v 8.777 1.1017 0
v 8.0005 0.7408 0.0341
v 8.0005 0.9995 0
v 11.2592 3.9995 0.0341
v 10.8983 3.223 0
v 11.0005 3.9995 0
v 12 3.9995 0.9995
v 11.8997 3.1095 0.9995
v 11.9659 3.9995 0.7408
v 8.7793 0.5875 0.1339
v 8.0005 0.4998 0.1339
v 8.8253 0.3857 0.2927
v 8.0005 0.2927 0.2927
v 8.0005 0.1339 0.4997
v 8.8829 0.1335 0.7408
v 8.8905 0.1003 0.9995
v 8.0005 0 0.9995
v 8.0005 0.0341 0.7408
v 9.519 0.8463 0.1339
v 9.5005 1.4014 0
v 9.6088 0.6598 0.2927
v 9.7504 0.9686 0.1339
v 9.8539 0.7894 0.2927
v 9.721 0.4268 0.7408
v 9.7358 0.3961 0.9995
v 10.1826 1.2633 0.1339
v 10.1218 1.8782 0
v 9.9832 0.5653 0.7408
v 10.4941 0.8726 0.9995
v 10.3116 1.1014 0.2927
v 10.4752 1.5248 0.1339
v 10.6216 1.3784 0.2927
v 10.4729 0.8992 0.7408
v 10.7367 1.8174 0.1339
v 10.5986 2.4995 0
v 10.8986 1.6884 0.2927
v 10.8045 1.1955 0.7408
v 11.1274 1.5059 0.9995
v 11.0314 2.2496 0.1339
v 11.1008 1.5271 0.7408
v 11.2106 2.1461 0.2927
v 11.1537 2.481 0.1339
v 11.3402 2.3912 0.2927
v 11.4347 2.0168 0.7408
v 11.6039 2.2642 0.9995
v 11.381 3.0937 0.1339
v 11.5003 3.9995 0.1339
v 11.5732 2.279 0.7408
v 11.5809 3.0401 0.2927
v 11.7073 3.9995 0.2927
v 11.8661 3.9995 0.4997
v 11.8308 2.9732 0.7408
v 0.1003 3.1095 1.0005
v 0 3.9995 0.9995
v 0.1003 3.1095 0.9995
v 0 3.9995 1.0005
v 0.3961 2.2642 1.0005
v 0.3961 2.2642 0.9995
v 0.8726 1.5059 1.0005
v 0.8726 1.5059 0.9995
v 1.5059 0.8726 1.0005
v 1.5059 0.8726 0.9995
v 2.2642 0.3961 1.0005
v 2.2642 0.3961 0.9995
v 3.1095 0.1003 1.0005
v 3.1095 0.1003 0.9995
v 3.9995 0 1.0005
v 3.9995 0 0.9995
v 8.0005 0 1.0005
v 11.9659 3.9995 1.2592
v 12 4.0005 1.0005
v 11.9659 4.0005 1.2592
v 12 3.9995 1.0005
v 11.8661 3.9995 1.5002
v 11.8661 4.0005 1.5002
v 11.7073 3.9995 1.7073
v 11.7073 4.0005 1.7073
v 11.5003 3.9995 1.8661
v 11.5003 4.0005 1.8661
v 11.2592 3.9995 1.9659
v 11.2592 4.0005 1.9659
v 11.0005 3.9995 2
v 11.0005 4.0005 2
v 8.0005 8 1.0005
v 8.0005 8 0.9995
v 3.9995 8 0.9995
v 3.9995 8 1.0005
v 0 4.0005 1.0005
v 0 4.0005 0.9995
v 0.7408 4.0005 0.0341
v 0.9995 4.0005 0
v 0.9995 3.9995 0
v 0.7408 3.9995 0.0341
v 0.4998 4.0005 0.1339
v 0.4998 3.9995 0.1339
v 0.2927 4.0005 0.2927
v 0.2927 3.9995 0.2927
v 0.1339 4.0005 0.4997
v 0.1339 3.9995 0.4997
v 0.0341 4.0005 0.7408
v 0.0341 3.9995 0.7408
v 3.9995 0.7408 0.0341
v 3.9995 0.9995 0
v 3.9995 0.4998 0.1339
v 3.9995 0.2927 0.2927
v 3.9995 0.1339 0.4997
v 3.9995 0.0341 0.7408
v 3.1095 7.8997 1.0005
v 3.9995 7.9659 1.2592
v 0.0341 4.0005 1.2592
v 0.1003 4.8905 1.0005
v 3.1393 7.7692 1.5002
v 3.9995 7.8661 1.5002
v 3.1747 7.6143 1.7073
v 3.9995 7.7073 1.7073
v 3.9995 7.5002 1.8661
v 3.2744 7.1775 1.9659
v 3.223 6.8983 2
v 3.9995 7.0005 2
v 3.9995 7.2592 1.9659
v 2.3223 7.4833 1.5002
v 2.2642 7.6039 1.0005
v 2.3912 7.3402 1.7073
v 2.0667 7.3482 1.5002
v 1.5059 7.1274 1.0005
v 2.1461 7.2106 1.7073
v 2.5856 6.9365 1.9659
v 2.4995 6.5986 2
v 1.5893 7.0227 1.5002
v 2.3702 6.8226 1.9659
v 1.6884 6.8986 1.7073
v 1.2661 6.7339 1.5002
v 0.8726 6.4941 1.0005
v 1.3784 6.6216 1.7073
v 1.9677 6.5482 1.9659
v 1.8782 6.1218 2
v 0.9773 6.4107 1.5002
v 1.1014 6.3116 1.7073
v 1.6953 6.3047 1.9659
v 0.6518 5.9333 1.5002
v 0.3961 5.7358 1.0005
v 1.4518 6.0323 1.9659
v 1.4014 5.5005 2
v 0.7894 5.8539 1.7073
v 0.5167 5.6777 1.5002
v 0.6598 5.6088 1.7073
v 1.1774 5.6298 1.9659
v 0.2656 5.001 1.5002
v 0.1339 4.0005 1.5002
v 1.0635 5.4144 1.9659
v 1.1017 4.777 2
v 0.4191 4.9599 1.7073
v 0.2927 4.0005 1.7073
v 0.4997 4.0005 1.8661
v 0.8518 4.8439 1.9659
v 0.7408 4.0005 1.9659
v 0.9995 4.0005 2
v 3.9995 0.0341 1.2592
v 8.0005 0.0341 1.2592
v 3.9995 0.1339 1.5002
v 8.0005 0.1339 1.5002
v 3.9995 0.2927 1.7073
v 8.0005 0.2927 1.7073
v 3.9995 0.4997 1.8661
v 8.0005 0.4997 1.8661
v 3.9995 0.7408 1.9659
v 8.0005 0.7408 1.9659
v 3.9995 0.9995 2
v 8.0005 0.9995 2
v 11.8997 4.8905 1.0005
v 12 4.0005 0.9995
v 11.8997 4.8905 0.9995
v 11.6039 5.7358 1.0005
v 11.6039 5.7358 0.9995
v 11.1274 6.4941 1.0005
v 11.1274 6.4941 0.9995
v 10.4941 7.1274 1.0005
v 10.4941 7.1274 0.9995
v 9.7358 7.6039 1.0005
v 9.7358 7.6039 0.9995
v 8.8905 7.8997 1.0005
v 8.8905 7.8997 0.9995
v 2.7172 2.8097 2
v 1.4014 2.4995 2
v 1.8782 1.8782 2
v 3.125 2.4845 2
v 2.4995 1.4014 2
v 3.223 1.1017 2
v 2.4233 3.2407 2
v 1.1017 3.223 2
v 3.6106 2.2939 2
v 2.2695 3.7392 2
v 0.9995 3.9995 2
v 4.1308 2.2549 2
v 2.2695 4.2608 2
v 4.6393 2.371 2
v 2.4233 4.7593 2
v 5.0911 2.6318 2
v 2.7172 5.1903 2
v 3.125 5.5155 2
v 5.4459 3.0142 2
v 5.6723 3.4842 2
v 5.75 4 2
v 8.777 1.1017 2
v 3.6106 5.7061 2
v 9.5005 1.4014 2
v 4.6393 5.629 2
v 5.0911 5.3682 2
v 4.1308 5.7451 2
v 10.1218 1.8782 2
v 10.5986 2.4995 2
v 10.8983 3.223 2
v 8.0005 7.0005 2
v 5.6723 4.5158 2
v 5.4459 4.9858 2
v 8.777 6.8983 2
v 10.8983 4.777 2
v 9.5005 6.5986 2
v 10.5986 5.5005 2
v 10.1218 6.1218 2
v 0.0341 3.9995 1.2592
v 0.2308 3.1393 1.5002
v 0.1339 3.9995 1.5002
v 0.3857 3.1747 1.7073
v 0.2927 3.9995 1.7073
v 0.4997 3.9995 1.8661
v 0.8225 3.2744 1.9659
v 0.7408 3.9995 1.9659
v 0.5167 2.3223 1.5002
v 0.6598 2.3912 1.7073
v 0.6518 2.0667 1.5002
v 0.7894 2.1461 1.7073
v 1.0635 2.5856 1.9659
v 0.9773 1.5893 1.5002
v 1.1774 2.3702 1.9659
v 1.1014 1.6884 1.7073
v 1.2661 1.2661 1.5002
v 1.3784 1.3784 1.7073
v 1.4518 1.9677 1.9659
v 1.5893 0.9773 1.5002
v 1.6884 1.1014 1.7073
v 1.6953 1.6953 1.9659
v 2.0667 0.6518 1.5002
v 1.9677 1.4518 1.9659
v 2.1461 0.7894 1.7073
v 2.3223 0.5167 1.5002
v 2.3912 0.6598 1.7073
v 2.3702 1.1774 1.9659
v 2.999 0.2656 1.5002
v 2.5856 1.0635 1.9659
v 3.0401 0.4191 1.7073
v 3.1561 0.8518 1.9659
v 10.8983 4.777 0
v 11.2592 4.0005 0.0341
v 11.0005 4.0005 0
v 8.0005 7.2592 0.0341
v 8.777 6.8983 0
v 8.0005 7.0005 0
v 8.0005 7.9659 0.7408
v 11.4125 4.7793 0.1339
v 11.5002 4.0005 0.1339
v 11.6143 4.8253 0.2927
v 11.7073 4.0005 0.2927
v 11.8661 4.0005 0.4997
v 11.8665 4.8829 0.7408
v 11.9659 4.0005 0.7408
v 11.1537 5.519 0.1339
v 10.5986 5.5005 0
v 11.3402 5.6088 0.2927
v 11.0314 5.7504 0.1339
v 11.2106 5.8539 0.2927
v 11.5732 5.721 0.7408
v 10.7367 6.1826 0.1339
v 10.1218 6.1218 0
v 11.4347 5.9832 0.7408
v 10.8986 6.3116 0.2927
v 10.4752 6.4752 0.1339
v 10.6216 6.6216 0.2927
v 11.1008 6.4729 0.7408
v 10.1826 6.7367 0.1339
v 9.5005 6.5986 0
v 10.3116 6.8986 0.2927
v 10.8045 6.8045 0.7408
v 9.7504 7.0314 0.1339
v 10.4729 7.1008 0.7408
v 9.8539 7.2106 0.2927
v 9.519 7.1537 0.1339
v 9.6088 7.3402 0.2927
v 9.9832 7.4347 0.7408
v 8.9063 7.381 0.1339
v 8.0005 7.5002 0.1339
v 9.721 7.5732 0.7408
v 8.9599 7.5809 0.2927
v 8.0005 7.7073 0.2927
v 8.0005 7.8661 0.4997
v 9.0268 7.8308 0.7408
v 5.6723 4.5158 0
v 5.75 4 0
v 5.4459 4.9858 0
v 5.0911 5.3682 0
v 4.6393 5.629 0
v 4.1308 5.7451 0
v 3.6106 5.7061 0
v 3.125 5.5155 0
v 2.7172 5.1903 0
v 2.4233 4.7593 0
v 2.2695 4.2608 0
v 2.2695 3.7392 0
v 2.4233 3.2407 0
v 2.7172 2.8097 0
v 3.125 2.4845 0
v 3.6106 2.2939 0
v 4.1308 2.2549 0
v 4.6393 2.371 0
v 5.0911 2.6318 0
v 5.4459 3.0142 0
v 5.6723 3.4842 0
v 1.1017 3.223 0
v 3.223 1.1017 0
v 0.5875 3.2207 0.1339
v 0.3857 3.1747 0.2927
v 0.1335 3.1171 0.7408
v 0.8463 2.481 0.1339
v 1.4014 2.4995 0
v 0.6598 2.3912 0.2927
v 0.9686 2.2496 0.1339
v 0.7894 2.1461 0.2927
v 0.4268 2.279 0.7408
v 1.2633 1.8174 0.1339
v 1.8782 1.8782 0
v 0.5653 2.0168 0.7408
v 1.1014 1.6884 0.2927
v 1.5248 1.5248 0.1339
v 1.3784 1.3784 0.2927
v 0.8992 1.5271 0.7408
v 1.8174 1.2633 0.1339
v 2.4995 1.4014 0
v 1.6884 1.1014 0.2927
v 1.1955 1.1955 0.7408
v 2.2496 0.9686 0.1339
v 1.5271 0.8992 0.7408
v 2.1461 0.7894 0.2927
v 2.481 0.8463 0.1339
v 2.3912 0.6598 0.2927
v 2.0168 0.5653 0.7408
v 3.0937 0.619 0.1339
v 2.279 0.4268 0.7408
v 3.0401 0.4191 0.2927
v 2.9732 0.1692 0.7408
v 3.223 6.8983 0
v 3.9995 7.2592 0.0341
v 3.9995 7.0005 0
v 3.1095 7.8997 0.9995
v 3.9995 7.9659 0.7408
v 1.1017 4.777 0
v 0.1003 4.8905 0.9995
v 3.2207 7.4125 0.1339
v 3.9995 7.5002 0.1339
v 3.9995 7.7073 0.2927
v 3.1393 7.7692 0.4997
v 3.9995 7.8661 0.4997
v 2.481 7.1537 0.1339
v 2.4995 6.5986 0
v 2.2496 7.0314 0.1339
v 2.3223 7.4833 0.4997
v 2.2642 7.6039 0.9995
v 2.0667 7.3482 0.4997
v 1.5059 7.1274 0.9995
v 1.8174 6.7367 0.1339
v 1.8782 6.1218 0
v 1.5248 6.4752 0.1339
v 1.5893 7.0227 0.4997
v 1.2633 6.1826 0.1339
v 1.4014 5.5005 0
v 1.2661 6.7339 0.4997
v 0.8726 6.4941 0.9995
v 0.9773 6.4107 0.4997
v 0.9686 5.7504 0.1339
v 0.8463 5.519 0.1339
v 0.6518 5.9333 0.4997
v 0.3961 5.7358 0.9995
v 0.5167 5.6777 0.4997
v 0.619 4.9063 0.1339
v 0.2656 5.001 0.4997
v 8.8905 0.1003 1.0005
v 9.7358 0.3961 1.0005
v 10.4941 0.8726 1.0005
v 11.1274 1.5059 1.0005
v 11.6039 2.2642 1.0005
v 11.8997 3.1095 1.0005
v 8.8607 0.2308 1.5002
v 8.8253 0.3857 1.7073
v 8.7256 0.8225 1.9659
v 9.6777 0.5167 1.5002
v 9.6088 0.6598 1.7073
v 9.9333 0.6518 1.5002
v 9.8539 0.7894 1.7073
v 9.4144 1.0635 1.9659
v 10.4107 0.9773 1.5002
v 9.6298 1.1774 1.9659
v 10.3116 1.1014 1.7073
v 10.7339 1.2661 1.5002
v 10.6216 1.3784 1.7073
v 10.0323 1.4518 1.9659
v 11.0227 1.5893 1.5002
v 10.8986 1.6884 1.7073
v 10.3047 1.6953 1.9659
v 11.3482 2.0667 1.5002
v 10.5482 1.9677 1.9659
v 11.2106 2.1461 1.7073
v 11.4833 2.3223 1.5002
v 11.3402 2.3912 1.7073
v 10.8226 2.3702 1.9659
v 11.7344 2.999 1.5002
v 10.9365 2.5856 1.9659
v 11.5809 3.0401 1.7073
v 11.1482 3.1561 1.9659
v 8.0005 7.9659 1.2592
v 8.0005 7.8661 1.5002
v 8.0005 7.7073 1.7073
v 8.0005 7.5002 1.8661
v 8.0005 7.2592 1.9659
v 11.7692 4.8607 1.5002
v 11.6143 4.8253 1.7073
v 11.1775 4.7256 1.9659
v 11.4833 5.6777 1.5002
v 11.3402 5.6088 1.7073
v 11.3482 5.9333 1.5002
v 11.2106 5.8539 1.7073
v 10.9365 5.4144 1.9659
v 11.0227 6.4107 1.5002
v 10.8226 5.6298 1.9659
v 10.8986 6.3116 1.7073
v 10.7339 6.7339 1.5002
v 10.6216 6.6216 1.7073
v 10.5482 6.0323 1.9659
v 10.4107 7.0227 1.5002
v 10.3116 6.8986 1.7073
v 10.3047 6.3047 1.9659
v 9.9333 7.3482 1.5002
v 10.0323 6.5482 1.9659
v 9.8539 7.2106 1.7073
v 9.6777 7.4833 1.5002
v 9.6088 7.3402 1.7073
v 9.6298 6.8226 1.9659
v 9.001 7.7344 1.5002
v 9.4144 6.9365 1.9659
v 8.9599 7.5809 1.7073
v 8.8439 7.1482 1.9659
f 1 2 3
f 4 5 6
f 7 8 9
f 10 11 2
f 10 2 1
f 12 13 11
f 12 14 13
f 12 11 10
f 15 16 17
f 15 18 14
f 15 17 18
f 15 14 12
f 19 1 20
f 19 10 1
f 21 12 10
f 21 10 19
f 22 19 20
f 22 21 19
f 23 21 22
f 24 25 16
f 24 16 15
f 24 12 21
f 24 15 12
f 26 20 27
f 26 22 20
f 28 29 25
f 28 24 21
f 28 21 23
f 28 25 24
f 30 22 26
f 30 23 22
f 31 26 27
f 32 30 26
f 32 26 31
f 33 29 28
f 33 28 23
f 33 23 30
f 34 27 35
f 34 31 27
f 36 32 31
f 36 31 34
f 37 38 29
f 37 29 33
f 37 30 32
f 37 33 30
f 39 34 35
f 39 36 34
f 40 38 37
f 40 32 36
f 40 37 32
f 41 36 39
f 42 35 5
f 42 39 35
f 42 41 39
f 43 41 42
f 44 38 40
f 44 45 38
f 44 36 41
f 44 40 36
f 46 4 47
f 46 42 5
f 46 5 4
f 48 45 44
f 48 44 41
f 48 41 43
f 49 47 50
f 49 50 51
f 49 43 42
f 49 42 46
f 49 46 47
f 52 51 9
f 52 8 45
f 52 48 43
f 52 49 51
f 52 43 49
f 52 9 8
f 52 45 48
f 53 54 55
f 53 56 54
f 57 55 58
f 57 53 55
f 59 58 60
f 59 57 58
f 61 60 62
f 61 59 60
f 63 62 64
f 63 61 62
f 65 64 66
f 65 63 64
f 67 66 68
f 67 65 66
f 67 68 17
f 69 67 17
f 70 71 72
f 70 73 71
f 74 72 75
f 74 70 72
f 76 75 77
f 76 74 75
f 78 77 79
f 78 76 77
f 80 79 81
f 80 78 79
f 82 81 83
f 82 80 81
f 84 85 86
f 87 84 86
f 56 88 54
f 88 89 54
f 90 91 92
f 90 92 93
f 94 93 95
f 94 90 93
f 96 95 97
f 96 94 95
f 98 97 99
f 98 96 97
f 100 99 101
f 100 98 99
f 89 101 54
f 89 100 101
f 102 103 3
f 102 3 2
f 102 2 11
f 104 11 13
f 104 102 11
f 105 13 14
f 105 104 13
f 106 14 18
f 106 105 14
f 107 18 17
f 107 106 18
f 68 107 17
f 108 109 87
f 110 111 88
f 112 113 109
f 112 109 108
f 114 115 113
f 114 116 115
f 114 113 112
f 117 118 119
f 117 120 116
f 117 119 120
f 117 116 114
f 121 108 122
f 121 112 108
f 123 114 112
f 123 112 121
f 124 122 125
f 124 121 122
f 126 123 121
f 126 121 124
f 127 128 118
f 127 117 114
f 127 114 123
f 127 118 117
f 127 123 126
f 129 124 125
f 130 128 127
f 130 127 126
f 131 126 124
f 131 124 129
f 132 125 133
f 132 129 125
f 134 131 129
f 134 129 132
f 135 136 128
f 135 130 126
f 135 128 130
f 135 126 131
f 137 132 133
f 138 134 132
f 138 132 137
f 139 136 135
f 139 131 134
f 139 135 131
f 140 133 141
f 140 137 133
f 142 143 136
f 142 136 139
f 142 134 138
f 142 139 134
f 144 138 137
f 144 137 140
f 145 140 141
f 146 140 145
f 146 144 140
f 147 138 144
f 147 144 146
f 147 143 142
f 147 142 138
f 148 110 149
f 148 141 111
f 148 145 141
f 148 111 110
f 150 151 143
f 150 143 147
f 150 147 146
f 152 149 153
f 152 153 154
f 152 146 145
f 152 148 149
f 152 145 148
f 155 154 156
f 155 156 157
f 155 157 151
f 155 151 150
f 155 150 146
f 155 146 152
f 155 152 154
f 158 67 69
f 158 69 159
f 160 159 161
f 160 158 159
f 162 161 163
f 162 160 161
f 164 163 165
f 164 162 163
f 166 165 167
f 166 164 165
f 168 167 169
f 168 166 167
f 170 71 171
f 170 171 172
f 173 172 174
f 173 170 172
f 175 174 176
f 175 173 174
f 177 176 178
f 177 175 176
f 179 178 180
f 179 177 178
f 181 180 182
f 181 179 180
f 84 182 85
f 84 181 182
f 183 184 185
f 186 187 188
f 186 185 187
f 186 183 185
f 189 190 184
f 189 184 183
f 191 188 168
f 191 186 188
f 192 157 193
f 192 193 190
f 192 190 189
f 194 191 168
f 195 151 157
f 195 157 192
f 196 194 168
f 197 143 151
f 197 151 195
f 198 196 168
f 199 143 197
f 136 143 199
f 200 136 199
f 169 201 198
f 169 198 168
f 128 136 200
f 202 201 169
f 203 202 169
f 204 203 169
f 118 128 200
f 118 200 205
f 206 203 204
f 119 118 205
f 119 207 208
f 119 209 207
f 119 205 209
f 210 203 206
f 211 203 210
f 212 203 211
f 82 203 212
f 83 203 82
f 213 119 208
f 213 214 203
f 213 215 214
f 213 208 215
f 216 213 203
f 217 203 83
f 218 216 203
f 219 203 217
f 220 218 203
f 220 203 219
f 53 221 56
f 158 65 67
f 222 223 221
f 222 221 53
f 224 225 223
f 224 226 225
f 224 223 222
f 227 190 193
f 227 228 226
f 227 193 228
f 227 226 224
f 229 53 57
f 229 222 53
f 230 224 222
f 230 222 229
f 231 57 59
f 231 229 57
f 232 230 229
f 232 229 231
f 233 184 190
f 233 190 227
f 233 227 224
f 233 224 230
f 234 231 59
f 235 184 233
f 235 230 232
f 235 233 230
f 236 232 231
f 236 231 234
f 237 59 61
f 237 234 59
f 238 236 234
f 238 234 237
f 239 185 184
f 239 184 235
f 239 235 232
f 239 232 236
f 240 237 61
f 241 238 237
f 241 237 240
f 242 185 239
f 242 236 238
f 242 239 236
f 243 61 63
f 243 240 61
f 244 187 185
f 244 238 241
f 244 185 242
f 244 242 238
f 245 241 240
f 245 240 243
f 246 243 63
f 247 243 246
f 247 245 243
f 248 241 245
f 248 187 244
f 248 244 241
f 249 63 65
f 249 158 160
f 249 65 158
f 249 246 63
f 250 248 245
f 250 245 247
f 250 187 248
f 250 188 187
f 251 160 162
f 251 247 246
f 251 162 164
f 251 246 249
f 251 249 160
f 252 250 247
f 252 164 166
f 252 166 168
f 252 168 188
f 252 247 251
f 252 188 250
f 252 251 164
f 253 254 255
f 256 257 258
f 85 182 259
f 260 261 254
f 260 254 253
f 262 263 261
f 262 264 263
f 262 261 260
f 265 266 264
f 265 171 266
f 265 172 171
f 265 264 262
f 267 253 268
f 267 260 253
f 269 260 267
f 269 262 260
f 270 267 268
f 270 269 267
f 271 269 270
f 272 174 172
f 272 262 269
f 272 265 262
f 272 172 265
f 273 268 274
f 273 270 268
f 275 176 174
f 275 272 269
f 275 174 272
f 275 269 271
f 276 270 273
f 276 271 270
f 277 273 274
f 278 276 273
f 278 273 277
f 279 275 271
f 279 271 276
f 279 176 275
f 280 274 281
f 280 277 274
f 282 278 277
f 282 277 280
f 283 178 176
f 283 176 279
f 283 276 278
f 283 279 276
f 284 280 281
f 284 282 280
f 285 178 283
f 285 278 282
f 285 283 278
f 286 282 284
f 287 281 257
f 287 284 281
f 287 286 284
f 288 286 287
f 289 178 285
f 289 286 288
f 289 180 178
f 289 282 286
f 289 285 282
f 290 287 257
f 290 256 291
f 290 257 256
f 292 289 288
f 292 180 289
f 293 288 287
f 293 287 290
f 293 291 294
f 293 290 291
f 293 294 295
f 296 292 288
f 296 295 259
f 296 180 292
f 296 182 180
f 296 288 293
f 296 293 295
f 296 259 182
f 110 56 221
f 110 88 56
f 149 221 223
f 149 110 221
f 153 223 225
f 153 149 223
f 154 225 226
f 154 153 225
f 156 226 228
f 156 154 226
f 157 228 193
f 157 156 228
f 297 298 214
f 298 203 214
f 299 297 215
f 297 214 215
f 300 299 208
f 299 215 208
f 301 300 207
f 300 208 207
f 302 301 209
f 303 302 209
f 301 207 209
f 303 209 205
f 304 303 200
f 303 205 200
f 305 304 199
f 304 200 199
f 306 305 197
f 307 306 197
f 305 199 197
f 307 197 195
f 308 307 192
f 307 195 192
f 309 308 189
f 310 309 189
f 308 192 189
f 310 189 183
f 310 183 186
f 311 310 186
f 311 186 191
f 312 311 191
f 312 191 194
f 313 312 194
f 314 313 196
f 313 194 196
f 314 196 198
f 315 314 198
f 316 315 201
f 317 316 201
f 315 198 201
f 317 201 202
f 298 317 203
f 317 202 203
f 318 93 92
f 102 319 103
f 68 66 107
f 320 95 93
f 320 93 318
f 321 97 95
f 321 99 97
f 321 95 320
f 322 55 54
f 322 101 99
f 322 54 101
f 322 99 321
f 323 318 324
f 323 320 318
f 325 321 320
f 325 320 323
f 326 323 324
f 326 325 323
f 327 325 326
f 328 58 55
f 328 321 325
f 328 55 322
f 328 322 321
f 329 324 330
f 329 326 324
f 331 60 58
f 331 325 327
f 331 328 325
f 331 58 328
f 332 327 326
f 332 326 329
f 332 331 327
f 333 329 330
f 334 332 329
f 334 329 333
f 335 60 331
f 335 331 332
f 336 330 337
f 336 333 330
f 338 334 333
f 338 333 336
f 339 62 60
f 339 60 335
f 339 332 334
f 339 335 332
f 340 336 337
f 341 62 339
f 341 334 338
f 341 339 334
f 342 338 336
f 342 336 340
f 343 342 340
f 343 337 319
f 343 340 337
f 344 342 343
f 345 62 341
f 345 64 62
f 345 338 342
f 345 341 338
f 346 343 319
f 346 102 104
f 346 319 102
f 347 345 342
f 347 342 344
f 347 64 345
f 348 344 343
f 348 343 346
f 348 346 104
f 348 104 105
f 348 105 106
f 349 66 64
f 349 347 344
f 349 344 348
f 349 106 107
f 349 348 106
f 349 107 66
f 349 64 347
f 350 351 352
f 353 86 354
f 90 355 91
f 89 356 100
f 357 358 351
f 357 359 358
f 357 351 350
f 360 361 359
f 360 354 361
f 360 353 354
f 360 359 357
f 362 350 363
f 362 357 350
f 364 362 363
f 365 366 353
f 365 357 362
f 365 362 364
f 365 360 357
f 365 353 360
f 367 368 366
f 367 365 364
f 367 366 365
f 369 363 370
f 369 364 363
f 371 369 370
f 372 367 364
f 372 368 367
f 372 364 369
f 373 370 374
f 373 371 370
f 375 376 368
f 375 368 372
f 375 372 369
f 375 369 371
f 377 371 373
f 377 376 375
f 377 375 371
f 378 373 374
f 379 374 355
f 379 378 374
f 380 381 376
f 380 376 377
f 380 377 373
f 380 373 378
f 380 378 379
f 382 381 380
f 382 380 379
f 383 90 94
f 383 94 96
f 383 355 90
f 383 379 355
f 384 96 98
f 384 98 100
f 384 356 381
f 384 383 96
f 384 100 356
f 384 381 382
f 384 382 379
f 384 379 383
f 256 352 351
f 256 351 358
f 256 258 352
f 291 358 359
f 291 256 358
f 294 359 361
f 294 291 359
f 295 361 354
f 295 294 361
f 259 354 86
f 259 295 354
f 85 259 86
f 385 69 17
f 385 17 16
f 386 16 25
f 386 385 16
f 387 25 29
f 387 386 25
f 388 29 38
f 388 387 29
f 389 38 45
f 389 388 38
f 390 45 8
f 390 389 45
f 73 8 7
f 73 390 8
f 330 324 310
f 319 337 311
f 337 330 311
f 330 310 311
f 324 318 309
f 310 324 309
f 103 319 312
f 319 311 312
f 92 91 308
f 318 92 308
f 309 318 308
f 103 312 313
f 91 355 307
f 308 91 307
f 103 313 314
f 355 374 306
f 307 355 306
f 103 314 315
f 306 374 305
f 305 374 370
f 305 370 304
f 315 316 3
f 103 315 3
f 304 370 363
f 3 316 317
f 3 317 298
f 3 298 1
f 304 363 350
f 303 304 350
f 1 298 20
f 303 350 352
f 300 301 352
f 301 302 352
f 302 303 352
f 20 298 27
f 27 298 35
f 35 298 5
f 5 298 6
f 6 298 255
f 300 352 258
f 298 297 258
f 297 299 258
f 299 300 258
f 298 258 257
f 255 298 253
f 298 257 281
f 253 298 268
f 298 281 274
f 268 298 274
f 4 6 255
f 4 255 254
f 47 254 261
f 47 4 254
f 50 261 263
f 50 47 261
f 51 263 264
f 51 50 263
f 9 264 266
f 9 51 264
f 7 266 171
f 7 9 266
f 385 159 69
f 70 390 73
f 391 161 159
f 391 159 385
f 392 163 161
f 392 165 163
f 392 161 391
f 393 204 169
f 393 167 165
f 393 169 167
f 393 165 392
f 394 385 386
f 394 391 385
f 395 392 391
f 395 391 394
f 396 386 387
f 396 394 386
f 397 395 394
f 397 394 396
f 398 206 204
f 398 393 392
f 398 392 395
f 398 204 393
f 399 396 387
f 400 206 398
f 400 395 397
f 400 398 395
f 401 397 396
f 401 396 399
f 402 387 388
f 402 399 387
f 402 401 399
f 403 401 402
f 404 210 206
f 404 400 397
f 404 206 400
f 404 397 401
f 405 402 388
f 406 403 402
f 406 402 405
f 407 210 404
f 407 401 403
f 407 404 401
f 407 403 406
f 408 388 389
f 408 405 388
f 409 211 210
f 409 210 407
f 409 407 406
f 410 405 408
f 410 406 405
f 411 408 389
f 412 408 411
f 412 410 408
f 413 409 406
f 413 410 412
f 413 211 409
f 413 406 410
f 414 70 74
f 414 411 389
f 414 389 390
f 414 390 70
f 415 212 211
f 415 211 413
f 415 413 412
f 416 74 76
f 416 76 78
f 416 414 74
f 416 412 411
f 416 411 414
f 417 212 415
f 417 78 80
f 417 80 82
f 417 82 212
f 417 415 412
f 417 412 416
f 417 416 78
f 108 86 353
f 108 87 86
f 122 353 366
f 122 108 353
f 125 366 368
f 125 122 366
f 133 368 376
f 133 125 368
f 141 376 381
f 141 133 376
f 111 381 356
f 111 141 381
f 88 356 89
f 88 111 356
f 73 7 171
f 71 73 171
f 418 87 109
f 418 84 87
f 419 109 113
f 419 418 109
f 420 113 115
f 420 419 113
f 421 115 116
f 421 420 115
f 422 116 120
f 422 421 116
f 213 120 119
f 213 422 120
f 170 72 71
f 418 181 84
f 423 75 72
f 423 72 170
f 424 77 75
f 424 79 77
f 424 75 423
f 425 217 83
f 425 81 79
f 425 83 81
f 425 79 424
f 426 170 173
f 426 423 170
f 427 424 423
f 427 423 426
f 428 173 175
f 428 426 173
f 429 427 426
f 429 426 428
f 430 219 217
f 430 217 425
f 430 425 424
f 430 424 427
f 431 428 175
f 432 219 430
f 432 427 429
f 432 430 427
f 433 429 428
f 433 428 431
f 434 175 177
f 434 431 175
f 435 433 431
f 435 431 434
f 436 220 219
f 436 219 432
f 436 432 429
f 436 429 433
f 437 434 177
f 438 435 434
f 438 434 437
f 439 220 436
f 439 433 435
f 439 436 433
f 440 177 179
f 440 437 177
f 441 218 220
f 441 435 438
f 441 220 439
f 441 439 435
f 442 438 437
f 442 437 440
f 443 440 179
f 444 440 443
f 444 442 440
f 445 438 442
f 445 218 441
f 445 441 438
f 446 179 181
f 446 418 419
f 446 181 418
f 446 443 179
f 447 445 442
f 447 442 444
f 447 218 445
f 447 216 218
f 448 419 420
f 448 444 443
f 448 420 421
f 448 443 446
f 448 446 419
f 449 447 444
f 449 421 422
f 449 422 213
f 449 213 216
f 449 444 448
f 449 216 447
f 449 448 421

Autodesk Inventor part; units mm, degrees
ref_plane "YZ Plane" through (0, 0, 0) normal (1, 0, 0) x (0, 1, 0)
ref_plane "XZ Plane" through (0, 0, 0) normal (0, 1, 0) x (-1, 0, 0)
ref_plane "XY Plane" through (0, 0, 0) normal (0, 0, 1) x (1, 0, 0)
sketch "Sketch3" plane through (0, 0, 0) normal (0, 0, 1) x (1, 0, 0)
  line L0 (0, 0) -> (12, 0)
  line L1 (12, 0) -> (12, 8)
  line L2 (12, 8) -> (0, 8)
  line L3 (0, 8) -> (0, 0)
  dimension "d6" = 12
  dimension "d7" = 8
extrude "Extrusion2" add sketch "Sketch3" along normal blind 2
fillet "Fillet2" radius 4 4 edges at (0, 8, 1) (0, 0, 1) (12, 0, 1) (12, 8, 1)
sketch "Sketch4" plane through (0, 0, 2) normal (0, 0, 1) x (1, 0, 0)
  arc A0 (4, 8) -> (4, 0) centre (4, 4) ccw projected
  circle A1 centre (4, 4) radius 1.75
  point P0 (0, 0)
  dimension "d11" = 3.5
extrude "Extrusion3" cut sketch "Sketch4" against normal blind 2
fillet "Fillet3" radius 1 8 edges at (1.1714, 6.8286, 2) (6, 0, 2) (10.8286, 1.1714, 2) (6, 8, 2) (1.1714, 6.8286, 0) (6, 0, 0) (10.8286, 1.1714, 0) (6, 8, 0)
properties part number "Plectrum"
